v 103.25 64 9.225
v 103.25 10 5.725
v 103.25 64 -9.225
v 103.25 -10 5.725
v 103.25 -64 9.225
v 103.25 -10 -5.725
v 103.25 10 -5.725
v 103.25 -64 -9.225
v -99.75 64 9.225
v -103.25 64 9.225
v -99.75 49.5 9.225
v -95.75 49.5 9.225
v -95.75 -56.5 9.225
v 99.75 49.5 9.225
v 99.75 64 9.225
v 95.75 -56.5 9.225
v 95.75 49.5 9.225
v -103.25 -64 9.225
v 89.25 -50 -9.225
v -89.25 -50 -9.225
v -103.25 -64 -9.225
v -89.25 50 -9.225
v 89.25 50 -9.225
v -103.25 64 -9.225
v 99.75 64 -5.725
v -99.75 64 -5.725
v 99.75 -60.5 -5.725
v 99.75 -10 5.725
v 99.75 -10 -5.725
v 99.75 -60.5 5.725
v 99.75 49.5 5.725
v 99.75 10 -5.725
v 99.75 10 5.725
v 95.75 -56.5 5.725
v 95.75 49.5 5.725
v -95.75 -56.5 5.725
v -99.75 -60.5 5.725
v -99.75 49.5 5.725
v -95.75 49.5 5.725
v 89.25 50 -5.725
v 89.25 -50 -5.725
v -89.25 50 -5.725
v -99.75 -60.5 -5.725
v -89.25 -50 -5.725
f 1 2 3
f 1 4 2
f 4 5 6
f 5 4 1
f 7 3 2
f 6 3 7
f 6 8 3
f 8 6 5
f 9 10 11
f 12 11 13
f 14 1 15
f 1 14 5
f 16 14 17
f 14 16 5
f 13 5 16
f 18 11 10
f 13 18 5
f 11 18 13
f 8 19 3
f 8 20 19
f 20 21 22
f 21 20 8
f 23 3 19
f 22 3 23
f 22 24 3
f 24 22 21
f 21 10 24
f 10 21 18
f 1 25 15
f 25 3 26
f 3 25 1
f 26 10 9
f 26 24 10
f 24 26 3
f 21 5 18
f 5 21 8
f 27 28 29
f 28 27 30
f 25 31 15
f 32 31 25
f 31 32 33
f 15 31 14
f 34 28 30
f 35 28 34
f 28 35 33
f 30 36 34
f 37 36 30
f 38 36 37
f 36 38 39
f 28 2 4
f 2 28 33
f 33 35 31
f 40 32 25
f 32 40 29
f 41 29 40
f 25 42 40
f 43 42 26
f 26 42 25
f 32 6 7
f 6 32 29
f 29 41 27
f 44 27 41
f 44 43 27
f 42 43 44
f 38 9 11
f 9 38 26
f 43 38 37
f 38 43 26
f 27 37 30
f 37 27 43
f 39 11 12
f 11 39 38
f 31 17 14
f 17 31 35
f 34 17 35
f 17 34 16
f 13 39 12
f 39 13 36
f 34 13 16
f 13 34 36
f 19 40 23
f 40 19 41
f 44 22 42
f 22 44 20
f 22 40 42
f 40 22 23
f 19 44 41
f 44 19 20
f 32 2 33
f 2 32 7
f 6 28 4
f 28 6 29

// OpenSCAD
tolerance = 1;
size = [
  198.5,
  120,
  10.45];
margin = 4;
2m = 2 * margin;

difference() {
  cube(
    size=[
      size[0] + 2m,
      size[1] + 2m,
      size[2] + 2m,
    ],
    center=true);

  cube(
    size=[
      size[0] + tolerance,
      size[1] + tolerance,
      size[2] + tolerance,
    ],
    center=true);

  translate([0, size[1]/2,0])
  cube(
    size=[
      size[0] + tolerance,
      size[1] + tolerance,
      size[2] + tolerance,
    ],
    center=true);

  translate([0, size[1]-10,size[2]/2])
  cube(
    size=[
      size[0] + tolerance,
      size[1] + tolerance,
      size[2] + tolerance,
    ],
    center=true);

  translate([0,0, size[2]/2])
  cube(
    size=[
      size[0] - 7,
      size[1] - 7,
      size[2],
    ],
    center=true);

  translate([0,0, -size[2]/2])
  cube(
    size=[
      size[0] - 20,
      size[1] - 20,
      size[2],
    ],
    center=true);

  translate([size[0]/2, 0, 0])
  cube(
    size=[
      size[0] + tolerance,
      20,
      size[2] + tolerance,
    ],
    center=true);
}
